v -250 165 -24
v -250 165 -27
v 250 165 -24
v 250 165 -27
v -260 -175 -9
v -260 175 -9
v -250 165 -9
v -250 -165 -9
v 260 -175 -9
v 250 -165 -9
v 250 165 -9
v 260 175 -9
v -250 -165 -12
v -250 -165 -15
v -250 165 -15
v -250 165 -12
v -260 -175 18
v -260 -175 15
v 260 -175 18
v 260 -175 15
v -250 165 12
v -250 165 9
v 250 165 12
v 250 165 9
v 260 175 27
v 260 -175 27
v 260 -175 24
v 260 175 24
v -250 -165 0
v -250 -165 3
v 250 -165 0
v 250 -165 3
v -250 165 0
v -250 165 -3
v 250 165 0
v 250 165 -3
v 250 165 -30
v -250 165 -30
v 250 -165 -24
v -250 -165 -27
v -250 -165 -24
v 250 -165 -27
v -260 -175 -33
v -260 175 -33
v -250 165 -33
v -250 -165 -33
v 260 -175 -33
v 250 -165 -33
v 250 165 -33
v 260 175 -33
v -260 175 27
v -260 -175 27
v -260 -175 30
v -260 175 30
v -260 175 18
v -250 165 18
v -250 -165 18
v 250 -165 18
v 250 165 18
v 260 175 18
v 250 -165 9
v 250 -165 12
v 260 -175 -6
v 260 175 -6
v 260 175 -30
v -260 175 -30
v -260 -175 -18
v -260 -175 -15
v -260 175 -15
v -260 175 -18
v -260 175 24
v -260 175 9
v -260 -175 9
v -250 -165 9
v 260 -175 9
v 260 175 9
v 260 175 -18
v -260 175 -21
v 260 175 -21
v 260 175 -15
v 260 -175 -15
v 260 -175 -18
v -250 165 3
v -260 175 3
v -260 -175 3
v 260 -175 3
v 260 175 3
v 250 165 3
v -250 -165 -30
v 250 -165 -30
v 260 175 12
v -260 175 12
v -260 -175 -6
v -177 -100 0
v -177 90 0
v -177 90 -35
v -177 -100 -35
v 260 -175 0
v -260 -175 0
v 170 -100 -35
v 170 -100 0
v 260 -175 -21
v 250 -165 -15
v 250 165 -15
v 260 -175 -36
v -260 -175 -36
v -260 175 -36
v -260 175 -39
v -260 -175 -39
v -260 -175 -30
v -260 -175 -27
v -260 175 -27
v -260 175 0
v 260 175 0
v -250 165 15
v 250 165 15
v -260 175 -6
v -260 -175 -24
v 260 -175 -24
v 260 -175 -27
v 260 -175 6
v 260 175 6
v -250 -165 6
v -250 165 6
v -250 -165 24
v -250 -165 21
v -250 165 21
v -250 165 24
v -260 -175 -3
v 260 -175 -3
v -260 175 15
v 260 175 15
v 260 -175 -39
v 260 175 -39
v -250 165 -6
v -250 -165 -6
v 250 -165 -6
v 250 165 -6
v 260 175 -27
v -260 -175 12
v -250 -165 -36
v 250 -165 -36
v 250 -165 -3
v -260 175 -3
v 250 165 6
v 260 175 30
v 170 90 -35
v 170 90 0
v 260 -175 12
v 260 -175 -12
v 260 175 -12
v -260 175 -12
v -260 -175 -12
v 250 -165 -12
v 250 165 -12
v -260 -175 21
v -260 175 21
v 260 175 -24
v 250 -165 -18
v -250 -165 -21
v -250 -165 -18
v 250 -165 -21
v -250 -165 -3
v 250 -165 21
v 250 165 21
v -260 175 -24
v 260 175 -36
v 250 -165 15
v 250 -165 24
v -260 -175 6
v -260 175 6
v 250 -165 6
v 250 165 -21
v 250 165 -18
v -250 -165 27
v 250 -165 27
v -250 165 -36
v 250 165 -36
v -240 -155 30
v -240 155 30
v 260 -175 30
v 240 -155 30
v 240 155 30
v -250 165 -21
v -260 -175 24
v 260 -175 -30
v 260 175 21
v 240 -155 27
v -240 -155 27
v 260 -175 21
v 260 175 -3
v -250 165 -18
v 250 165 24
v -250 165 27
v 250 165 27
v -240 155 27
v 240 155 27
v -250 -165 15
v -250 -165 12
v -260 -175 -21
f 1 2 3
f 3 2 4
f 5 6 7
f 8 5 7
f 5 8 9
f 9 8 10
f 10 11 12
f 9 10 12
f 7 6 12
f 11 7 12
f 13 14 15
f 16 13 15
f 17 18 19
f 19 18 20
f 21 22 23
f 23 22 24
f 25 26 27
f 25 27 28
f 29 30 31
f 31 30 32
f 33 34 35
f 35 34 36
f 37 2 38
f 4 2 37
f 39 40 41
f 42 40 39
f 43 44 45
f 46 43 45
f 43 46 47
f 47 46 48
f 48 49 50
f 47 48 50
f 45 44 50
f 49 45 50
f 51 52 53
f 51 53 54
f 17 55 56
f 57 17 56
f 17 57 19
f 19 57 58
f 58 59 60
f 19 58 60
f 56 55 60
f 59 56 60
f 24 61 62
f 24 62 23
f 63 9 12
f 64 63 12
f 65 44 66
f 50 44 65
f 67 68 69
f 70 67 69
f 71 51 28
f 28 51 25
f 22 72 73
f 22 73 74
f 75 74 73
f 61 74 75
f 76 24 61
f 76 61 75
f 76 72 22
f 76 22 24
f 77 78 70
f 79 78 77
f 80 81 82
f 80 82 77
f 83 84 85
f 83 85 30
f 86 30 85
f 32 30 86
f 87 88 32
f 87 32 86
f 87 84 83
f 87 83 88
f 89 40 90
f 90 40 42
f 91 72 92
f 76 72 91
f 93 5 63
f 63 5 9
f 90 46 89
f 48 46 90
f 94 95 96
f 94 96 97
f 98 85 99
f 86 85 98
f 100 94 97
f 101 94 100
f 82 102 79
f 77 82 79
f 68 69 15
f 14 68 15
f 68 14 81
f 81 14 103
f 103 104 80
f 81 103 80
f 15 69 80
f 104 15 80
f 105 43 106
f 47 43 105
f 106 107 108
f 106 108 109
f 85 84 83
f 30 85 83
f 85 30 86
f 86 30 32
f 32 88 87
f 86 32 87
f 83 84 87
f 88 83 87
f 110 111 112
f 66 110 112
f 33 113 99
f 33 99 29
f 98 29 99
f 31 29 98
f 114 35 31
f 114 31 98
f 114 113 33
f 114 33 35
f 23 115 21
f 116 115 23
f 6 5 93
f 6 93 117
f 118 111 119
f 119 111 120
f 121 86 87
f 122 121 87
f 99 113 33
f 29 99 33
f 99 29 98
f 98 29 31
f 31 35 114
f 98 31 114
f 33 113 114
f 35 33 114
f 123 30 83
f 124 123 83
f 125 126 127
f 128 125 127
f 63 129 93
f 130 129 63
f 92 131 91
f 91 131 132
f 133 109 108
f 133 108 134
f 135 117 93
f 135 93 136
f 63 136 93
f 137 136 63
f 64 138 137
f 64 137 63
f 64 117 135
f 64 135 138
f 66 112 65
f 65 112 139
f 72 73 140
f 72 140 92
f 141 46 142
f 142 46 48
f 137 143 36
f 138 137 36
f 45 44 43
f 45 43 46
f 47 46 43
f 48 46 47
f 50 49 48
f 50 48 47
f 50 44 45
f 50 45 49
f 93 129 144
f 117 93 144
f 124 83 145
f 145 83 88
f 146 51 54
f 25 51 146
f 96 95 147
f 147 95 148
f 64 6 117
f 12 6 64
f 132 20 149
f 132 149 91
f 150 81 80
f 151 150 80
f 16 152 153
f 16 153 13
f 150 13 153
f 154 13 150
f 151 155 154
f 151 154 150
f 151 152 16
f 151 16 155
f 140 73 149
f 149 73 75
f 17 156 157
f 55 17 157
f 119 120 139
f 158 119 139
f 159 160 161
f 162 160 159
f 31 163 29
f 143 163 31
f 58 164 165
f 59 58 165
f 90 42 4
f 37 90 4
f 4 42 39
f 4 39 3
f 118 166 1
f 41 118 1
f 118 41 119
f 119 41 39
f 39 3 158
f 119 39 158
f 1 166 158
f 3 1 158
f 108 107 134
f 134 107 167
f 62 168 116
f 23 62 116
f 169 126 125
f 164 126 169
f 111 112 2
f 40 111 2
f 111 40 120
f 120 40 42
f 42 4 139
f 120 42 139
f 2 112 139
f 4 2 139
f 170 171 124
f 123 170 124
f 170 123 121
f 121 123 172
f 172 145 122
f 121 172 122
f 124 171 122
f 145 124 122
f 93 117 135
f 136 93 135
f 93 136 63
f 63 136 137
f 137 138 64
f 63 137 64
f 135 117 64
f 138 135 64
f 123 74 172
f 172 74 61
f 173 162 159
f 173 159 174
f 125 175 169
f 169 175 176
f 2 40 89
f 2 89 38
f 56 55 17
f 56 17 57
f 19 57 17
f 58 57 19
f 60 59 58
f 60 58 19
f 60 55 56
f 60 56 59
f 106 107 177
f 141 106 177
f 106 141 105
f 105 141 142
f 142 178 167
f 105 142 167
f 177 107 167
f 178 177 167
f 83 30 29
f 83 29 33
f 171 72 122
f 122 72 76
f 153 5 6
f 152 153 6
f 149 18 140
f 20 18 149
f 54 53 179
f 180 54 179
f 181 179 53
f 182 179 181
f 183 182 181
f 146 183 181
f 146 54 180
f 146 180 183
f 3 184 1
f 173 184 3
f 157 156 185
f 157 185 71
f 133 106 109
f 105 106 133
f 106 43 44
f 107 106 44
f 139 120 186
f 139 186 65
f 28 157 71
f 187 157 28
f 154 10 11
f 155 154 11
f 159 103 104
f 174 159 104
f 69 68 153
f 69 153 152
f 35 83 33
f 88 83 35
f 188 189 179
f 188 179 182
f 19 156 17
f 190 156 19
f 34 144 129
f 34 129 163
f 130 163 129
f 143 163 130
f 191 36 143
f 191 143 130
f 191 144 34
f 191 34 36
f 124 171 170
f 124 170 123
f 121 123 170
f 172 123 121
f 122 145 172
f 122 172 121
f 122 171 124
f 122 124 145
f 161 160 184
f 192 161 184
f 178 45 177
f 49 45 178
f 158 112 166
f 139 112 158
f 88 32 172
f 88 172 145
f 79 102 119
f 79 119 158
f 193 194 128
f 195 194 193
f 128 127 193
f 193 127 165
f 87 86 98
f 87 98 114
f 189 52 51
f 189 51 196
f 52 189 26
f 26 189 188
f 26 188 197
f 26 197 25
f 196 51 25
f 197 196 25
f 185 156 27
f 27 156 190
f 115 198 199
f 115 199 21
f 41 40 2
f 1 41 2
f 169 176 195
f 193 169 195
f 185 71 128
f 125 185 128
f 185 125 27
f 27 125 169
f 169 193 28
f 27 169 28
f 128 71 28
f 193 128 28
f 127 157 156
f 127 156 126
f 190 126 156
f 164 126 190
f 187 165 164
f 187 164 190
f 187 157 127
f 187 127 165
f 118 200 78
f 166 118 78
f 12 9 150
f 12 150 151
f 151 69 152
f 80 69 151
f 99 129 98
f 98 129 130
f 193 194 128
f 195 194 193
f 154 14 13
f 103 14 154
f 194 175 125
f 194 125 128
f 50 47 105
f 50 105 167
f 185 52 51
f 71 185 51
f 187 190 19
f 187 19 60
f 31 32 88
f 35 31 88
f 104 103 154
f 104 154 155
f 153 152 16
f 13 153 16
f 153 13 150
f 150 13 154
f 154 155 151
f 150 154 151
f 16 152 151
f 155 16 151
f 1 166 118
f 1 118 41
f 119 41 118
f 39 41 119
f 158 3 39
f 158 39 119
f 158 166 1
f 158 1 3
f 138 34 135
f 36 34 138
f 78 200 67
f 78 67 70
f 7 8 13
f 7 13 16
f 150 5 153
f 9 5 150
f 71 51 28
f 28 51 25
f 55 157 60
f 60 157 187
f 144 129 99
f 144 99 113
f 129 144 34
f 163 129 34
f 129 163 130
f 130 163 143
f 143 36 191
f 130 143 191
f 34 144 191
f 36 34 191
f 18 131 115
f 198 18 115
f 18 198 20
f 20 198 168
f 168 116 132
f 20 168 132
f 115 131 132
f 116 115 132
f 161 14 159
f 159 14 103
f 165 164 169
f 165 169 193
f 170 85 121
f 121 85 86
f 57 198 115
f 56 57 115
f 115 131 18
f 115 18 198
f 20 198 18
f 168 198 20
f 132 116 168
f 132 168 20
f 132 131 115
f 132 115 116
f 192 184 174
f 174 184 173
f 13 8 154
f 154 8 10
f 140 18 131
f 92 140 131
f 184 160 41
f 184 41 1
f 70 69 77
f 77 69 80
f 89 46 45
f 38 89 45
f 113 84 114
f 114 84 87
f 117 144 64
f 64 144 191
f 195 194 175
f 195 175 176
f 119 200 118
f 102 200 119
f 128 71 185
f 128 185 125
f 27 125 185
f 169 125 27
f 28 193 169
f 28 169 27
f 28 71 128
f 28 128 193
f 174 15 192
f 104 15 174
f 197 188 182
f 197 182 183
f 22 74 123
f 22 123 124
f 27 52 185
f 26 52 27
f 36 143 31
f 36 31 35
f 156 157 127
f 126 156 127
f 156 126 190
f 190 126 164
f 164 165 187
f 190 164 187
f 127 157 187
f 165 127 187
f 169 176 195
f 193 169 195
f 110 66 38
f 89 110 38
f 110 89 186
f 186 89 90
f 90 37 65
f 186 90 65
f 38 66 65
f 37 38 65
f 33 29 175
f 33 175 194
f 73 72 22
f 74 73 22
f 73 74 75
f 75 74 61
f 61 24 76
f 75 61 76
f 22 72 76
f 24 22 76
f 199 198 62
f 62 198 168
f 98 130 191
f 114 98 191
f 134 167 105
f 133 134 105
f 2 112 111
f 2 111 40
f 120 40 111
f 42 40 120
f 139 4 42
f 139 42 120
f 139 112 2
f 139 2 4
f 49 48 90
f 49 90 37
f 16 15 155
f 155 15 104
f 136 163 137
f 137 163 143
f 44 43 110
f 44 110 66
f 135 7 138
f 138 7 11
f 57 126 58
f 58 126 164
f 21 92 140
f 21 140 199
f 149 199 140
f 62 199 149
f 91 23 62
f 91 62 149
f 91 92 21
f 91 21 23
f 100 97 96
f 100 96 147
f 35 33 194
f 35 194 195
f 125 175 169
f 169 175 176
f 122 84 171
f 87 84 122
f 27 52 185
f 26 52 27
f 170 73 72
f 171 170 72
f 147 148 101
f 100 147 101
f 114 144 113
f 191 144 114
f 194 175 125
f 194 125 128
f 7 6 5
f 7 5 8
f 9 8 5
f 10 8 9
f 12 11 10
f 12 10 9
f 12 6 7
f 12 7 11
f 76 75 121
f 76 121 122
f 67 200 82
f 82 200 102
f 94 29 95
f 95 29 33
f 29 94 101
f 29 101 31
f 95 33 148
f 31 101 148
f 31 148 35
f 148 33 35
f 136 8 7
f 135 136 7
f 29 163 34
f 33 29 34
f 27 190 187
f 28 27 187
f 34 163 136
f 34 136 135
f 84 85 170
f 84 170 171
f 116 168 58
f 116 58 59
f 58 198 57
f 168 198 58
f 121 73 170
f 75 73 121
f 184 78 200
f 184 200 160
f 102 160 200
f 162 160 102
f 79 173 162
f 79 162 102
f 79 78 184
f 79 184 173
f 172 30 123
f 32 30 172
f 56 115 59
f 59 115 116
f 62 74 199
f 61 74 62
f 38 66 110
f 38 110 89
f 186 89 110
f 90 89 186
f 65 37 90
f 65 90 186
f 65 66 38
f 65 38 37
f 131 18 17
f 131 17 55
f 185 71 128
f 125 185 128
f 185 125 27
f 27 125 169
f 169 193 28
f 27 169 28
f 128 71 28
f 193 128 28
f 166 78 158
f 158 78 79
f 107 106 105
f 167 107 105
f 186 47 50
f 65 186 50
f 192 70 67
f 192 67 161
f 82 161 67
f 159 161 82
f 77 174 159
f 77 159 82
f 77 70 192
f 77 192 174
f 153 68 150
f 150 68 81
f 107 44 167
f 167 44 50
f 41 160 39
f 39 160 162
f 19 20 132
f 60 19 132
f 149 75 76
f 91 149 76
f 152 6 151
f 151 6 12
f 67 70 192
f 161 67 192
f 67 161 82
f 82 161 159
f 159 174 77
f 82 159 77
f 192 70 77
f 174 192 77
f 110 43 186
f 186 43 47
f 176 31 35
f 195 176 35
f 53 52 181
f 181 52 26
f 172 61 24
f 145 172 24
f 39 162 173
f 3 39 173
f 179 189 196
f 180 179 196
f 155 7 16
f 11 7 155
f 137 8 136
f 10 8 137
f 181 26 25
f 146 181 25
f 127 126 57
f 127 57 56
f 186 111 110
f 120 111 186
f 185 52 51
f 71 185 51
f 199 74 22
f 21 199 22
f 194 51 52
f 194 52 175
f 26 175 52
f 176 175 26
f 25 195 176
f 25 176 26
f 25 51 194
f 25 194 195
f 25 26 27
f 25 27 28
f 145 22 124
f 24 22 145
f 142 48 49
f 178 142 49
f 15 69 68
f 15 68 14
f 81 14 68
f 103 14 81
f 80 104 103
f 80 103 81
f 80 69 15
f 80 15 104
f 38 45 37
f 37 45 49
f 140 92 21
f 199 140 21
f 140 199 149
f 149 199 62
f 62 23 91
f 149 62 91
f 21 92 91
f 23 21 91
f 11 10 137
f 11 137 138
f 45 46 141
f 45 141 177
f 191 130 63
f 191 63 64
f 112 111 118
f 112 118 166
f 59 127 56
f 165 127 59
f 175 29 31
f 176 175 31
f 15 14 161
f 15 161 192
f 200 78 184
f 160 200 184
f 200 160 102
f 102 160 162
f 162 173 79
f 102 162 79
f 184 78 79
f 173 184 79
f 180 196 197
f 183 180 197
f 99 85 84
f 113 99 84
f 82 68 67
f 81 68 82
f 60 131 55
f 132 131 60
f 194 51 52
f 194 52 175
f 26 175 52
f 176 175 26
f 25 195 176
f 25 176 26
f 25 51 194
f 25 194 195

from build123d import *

# Parameters (mm, degrees)
F0_W      = 500
F0_H      = 330
F1_DEPTH  = 27
F2_W      = 347
F2_H      = 190
F3_DEPTH  = 35
F4_W      = 520
F4_H      = 350
F4_W_2    = 500
F4_H_2    = 330
F4_W_3    = 480
F4_H_3    = 310
F5_DEPTH  = 3
F7_DEPTH  = 3
F6_W      = 520
F6_H      = 350
F6_W_2    = 500
F6_H_2    = 330
F15_W     = 520
F15_H     = 350
F16_DEPTH = 3


# Not quite as in the source:
# - a feature names something its author has since deleted; it is built from what else it names


with BuildPart() as f1:
    # F0 (on Top) → F1 (new body)
    with BuildSketch(Plane.XY):
        Rectangle(F0_W, F0_H)
    extrude(amount=F1_DEPTH)

    # F2 (on face) → F3 (join)
    with BuildSketch(Plane(origin=(0, 0, 0), x_dir=(1, 0, 0), z_dir=(0, 0, -1))):
        with Locations((-3.5, 5)):
            Rectangle(F2_W, F2_H)
    extrude(amount=F3_DEPTH)


with BuildPart() as f5:
    # F4 (on face) → F5 (new body)
    with BuildSketch(Plane.XY.offset(27)):
        Rectangle(F4_W, F4_H)
        Rectangle(F4_W_2, F4_H_2, mode=Mode.SUBTRACT)
        Rectangle(F4_W_2, F4_H_2)
        Rectangle(F4_W_3, F4_H_3, mode=Mode.SUBTRACT)
    extrude(amount=F5_DEPTH)


with BuildPart() as f7:
    # F4 (on face) → F7 (new body)
    with BuildSketch(Plane.XY.offset(27)):
        Rectangle(F4_W, F4_H)
        Rectangle(F4_W_2, F4_H_2, mode=Mode.SUBTRACT)
    extrude(amount=-F7_DEPTH)


with BuildPart() as f7b:
    # F6 (on face) → F7, piece 2 (new body)
    with BuildSketch(Plane.XY.offset(27)):
        Rectangle(F6_W, F6_H)
        Rectangle(F6_W_2, F6_H_2, mode=Mode.SUBTRACT)
    extrude(amount=-F7_DEPTH)


with BuildPart() as f8_1:
    # F8: instance of F7b
    add(f7b.part.mirror(Plane(origin=(0, 0, 24), x_dir=(1, 0, 0), z_dir=(0, 0, -1))))


with BuildPart() as f9_1:
    # F9: instance of F8_1
    add(f8_1.part.mirror(Plane(origin=(0, 0, 21), x_dir=(1, 0, 0), z_dir=(0, 0, -1))))


with BuildPart() as f9_2:
    # F9: instance of F7
    add(f7.part.mirror(Plane(origin=(0, 0, 21), x_dir=(1, 0, 0), z_dir=(0, 0, -1))))


with BuildPart() as f10_1:
    # F10: instance of F9_2
    add(f9_2.part.mirror(Plane(origin=(0, 0, 15), x_dir=(1, 0, 0), z_dir=(0, 0, -1))))


with BuildPart() as f10_2:
    # F10: instance of F9_1
    add(f9_1.part.mirror(Plane(origin=(0, 0, 15), x_dir=(1, 0, 0), z_dir=(0, 0, -1))))


with BuildPart() as f10_3:
    # F10: instance of F8_1
    add(f8_1.part.mirror(Plane(origin=(0, 0, 15), x_dir=(1, 0, 0), z_dir=(0, 0, -1))))


with BuildPart() as f10_4:
    # F10: instance of F7
    add(f7.part.mirror(Plane(origin=(0, 0, 15), x_dir=(1, 0, 0), z_dir=(0, 0, -1))))


with BuildPart() as f11_1:
    # F11: instance of F10_4
    add(f10_4.part.mirror(Plane(origin=(0, 0, 3), x_dir=(1, 0, 0), z_dir=(0, 0, -1))))


with BuildPart() as f11_2:
    # F11: instance of F10_3
    add(f10_3.part.mirror(Plane(origin=(0, 0, 3), x_dir=(1, 0, 0), z_dir=(0, 0, -1))))


with BuildPart() as f11_3:
    # F11: instance of F10_2
    add(f10_2.part.mirror(Plane(origin=(0, 0, 3), x_dir=(1, 0, 0), z_dir=(0, 0, -1))))


with BuildPart() as f11_4:
    # F11: instance of F10_1
    add(f10_1.part.mirror(Plane(origin=(0, 0, 3), x_dir=(1, 0, 0), z_dir=(0, 0, -1))))


with BuildPart() as f11_5:
    # F11: instance of F9_2
    add(f9_2.part.mirror(Plane(origin=(0, 0, 3), x_dir=(1, 0, 0), z_dir=(0, 0, -1))))


with BuildPart() as f11_6:
    # F11: instance of F9_1
    add(f9_1.part.mirror(Plane(origin=(0, 0, 3), x_dir=(1, 0, 0), z_dir=(0, 0, -1))))


with BuildPart() as f11_7:
    # F11: instance of F8_1
    add(f8_1.part.mirror(Plane(origin=(0, 0, 3), x_dir=(1, 0, 0), z_dir=(0, 0, -1))))


with BuildPart() as f11_8:
    # F11: instance of F7
    add(f7.part.mirror(Plane(origin=(0, 0, 3), x_dir=(1, 0, 0), z_dir=(0, 0, -1))))


with BuildPart() as f12_1:
    # F12: instance of F11_8
    add(f11_8.part.mirror(Plane(origin=(0, 0, -21), x_dir=(1, 0, 0), z_dir=(0, 0, -1))))


with BuildPart() as f12_2:
    # F12: instance of F11_7
    add(f11_7.part.mirror(Plane(origin=(0, 0, -21), x_dir=(1, 0, 0), z_dir=(0, 0, -1))))


with BuildPart() as f12_3:
    # F12: instance of F11_6
    add(f11_6.part.mirror(Plane(origin=(0, 0, -21), x_dir=(1, 0, 0), z_dir=(0, 0, -1))))


with BuildPart() as f12_4:
    # F12: instance of F11_5
    add(f11_5.part.mirror(Plane(origin=(0, 0, -21), x_dir=(1, 0, 0), z_dir=(0, 0, -1))))


with BuildPart() as f12_5:
    # F12: instance of F11_4
    add(f11_4.part.mirror(Plane(origin=(0, 0, -21), x_dir=(1, 0, 0), z_dir=(0, 0, -1))))


with BuildPart() as f12_6:
    # F12: instance of F11_3
    add(f11_3.part.mirror(Plane(origin=(0, 0, -21), x_dir=(1, 0, 0), z_dir=(0, 0, -1))))


with BuildPart() as f12_7:
    # F12: instance of F11_1
    add(f11_1.part.mirror(Plane(origin=(0, 0, -21), x_dir=(1, 0, 0), z_dir=(0, 0, -1))))


with BuildPart() as f16:
    # F15 (on face) → F16 (new body)
    with BuildSketch(Plane(origin=(0, 0, -36), x_dir=(1, 0, 0), z_dir=(0, 0, -1))):
        Rectangle(F15_W, F15_H)
    extrude(amount=F16_DEPTH)


solid = Compound([f1.part, f5.part, f7.part, f7b.part, f8_1.part, f9_1.part, f9_2.part, f10_1.part, f10_2.part, f10_3.part, f10_4.part, f11_1.part, f11_2.part, f11_3.part, f11_4.part, f11_5.part, f11_6.part, f11_7.part, f11_8.part, f12_1.part, f12_2.part, f12_3.part, f12_4.part, f12_5.part, f16.part])
